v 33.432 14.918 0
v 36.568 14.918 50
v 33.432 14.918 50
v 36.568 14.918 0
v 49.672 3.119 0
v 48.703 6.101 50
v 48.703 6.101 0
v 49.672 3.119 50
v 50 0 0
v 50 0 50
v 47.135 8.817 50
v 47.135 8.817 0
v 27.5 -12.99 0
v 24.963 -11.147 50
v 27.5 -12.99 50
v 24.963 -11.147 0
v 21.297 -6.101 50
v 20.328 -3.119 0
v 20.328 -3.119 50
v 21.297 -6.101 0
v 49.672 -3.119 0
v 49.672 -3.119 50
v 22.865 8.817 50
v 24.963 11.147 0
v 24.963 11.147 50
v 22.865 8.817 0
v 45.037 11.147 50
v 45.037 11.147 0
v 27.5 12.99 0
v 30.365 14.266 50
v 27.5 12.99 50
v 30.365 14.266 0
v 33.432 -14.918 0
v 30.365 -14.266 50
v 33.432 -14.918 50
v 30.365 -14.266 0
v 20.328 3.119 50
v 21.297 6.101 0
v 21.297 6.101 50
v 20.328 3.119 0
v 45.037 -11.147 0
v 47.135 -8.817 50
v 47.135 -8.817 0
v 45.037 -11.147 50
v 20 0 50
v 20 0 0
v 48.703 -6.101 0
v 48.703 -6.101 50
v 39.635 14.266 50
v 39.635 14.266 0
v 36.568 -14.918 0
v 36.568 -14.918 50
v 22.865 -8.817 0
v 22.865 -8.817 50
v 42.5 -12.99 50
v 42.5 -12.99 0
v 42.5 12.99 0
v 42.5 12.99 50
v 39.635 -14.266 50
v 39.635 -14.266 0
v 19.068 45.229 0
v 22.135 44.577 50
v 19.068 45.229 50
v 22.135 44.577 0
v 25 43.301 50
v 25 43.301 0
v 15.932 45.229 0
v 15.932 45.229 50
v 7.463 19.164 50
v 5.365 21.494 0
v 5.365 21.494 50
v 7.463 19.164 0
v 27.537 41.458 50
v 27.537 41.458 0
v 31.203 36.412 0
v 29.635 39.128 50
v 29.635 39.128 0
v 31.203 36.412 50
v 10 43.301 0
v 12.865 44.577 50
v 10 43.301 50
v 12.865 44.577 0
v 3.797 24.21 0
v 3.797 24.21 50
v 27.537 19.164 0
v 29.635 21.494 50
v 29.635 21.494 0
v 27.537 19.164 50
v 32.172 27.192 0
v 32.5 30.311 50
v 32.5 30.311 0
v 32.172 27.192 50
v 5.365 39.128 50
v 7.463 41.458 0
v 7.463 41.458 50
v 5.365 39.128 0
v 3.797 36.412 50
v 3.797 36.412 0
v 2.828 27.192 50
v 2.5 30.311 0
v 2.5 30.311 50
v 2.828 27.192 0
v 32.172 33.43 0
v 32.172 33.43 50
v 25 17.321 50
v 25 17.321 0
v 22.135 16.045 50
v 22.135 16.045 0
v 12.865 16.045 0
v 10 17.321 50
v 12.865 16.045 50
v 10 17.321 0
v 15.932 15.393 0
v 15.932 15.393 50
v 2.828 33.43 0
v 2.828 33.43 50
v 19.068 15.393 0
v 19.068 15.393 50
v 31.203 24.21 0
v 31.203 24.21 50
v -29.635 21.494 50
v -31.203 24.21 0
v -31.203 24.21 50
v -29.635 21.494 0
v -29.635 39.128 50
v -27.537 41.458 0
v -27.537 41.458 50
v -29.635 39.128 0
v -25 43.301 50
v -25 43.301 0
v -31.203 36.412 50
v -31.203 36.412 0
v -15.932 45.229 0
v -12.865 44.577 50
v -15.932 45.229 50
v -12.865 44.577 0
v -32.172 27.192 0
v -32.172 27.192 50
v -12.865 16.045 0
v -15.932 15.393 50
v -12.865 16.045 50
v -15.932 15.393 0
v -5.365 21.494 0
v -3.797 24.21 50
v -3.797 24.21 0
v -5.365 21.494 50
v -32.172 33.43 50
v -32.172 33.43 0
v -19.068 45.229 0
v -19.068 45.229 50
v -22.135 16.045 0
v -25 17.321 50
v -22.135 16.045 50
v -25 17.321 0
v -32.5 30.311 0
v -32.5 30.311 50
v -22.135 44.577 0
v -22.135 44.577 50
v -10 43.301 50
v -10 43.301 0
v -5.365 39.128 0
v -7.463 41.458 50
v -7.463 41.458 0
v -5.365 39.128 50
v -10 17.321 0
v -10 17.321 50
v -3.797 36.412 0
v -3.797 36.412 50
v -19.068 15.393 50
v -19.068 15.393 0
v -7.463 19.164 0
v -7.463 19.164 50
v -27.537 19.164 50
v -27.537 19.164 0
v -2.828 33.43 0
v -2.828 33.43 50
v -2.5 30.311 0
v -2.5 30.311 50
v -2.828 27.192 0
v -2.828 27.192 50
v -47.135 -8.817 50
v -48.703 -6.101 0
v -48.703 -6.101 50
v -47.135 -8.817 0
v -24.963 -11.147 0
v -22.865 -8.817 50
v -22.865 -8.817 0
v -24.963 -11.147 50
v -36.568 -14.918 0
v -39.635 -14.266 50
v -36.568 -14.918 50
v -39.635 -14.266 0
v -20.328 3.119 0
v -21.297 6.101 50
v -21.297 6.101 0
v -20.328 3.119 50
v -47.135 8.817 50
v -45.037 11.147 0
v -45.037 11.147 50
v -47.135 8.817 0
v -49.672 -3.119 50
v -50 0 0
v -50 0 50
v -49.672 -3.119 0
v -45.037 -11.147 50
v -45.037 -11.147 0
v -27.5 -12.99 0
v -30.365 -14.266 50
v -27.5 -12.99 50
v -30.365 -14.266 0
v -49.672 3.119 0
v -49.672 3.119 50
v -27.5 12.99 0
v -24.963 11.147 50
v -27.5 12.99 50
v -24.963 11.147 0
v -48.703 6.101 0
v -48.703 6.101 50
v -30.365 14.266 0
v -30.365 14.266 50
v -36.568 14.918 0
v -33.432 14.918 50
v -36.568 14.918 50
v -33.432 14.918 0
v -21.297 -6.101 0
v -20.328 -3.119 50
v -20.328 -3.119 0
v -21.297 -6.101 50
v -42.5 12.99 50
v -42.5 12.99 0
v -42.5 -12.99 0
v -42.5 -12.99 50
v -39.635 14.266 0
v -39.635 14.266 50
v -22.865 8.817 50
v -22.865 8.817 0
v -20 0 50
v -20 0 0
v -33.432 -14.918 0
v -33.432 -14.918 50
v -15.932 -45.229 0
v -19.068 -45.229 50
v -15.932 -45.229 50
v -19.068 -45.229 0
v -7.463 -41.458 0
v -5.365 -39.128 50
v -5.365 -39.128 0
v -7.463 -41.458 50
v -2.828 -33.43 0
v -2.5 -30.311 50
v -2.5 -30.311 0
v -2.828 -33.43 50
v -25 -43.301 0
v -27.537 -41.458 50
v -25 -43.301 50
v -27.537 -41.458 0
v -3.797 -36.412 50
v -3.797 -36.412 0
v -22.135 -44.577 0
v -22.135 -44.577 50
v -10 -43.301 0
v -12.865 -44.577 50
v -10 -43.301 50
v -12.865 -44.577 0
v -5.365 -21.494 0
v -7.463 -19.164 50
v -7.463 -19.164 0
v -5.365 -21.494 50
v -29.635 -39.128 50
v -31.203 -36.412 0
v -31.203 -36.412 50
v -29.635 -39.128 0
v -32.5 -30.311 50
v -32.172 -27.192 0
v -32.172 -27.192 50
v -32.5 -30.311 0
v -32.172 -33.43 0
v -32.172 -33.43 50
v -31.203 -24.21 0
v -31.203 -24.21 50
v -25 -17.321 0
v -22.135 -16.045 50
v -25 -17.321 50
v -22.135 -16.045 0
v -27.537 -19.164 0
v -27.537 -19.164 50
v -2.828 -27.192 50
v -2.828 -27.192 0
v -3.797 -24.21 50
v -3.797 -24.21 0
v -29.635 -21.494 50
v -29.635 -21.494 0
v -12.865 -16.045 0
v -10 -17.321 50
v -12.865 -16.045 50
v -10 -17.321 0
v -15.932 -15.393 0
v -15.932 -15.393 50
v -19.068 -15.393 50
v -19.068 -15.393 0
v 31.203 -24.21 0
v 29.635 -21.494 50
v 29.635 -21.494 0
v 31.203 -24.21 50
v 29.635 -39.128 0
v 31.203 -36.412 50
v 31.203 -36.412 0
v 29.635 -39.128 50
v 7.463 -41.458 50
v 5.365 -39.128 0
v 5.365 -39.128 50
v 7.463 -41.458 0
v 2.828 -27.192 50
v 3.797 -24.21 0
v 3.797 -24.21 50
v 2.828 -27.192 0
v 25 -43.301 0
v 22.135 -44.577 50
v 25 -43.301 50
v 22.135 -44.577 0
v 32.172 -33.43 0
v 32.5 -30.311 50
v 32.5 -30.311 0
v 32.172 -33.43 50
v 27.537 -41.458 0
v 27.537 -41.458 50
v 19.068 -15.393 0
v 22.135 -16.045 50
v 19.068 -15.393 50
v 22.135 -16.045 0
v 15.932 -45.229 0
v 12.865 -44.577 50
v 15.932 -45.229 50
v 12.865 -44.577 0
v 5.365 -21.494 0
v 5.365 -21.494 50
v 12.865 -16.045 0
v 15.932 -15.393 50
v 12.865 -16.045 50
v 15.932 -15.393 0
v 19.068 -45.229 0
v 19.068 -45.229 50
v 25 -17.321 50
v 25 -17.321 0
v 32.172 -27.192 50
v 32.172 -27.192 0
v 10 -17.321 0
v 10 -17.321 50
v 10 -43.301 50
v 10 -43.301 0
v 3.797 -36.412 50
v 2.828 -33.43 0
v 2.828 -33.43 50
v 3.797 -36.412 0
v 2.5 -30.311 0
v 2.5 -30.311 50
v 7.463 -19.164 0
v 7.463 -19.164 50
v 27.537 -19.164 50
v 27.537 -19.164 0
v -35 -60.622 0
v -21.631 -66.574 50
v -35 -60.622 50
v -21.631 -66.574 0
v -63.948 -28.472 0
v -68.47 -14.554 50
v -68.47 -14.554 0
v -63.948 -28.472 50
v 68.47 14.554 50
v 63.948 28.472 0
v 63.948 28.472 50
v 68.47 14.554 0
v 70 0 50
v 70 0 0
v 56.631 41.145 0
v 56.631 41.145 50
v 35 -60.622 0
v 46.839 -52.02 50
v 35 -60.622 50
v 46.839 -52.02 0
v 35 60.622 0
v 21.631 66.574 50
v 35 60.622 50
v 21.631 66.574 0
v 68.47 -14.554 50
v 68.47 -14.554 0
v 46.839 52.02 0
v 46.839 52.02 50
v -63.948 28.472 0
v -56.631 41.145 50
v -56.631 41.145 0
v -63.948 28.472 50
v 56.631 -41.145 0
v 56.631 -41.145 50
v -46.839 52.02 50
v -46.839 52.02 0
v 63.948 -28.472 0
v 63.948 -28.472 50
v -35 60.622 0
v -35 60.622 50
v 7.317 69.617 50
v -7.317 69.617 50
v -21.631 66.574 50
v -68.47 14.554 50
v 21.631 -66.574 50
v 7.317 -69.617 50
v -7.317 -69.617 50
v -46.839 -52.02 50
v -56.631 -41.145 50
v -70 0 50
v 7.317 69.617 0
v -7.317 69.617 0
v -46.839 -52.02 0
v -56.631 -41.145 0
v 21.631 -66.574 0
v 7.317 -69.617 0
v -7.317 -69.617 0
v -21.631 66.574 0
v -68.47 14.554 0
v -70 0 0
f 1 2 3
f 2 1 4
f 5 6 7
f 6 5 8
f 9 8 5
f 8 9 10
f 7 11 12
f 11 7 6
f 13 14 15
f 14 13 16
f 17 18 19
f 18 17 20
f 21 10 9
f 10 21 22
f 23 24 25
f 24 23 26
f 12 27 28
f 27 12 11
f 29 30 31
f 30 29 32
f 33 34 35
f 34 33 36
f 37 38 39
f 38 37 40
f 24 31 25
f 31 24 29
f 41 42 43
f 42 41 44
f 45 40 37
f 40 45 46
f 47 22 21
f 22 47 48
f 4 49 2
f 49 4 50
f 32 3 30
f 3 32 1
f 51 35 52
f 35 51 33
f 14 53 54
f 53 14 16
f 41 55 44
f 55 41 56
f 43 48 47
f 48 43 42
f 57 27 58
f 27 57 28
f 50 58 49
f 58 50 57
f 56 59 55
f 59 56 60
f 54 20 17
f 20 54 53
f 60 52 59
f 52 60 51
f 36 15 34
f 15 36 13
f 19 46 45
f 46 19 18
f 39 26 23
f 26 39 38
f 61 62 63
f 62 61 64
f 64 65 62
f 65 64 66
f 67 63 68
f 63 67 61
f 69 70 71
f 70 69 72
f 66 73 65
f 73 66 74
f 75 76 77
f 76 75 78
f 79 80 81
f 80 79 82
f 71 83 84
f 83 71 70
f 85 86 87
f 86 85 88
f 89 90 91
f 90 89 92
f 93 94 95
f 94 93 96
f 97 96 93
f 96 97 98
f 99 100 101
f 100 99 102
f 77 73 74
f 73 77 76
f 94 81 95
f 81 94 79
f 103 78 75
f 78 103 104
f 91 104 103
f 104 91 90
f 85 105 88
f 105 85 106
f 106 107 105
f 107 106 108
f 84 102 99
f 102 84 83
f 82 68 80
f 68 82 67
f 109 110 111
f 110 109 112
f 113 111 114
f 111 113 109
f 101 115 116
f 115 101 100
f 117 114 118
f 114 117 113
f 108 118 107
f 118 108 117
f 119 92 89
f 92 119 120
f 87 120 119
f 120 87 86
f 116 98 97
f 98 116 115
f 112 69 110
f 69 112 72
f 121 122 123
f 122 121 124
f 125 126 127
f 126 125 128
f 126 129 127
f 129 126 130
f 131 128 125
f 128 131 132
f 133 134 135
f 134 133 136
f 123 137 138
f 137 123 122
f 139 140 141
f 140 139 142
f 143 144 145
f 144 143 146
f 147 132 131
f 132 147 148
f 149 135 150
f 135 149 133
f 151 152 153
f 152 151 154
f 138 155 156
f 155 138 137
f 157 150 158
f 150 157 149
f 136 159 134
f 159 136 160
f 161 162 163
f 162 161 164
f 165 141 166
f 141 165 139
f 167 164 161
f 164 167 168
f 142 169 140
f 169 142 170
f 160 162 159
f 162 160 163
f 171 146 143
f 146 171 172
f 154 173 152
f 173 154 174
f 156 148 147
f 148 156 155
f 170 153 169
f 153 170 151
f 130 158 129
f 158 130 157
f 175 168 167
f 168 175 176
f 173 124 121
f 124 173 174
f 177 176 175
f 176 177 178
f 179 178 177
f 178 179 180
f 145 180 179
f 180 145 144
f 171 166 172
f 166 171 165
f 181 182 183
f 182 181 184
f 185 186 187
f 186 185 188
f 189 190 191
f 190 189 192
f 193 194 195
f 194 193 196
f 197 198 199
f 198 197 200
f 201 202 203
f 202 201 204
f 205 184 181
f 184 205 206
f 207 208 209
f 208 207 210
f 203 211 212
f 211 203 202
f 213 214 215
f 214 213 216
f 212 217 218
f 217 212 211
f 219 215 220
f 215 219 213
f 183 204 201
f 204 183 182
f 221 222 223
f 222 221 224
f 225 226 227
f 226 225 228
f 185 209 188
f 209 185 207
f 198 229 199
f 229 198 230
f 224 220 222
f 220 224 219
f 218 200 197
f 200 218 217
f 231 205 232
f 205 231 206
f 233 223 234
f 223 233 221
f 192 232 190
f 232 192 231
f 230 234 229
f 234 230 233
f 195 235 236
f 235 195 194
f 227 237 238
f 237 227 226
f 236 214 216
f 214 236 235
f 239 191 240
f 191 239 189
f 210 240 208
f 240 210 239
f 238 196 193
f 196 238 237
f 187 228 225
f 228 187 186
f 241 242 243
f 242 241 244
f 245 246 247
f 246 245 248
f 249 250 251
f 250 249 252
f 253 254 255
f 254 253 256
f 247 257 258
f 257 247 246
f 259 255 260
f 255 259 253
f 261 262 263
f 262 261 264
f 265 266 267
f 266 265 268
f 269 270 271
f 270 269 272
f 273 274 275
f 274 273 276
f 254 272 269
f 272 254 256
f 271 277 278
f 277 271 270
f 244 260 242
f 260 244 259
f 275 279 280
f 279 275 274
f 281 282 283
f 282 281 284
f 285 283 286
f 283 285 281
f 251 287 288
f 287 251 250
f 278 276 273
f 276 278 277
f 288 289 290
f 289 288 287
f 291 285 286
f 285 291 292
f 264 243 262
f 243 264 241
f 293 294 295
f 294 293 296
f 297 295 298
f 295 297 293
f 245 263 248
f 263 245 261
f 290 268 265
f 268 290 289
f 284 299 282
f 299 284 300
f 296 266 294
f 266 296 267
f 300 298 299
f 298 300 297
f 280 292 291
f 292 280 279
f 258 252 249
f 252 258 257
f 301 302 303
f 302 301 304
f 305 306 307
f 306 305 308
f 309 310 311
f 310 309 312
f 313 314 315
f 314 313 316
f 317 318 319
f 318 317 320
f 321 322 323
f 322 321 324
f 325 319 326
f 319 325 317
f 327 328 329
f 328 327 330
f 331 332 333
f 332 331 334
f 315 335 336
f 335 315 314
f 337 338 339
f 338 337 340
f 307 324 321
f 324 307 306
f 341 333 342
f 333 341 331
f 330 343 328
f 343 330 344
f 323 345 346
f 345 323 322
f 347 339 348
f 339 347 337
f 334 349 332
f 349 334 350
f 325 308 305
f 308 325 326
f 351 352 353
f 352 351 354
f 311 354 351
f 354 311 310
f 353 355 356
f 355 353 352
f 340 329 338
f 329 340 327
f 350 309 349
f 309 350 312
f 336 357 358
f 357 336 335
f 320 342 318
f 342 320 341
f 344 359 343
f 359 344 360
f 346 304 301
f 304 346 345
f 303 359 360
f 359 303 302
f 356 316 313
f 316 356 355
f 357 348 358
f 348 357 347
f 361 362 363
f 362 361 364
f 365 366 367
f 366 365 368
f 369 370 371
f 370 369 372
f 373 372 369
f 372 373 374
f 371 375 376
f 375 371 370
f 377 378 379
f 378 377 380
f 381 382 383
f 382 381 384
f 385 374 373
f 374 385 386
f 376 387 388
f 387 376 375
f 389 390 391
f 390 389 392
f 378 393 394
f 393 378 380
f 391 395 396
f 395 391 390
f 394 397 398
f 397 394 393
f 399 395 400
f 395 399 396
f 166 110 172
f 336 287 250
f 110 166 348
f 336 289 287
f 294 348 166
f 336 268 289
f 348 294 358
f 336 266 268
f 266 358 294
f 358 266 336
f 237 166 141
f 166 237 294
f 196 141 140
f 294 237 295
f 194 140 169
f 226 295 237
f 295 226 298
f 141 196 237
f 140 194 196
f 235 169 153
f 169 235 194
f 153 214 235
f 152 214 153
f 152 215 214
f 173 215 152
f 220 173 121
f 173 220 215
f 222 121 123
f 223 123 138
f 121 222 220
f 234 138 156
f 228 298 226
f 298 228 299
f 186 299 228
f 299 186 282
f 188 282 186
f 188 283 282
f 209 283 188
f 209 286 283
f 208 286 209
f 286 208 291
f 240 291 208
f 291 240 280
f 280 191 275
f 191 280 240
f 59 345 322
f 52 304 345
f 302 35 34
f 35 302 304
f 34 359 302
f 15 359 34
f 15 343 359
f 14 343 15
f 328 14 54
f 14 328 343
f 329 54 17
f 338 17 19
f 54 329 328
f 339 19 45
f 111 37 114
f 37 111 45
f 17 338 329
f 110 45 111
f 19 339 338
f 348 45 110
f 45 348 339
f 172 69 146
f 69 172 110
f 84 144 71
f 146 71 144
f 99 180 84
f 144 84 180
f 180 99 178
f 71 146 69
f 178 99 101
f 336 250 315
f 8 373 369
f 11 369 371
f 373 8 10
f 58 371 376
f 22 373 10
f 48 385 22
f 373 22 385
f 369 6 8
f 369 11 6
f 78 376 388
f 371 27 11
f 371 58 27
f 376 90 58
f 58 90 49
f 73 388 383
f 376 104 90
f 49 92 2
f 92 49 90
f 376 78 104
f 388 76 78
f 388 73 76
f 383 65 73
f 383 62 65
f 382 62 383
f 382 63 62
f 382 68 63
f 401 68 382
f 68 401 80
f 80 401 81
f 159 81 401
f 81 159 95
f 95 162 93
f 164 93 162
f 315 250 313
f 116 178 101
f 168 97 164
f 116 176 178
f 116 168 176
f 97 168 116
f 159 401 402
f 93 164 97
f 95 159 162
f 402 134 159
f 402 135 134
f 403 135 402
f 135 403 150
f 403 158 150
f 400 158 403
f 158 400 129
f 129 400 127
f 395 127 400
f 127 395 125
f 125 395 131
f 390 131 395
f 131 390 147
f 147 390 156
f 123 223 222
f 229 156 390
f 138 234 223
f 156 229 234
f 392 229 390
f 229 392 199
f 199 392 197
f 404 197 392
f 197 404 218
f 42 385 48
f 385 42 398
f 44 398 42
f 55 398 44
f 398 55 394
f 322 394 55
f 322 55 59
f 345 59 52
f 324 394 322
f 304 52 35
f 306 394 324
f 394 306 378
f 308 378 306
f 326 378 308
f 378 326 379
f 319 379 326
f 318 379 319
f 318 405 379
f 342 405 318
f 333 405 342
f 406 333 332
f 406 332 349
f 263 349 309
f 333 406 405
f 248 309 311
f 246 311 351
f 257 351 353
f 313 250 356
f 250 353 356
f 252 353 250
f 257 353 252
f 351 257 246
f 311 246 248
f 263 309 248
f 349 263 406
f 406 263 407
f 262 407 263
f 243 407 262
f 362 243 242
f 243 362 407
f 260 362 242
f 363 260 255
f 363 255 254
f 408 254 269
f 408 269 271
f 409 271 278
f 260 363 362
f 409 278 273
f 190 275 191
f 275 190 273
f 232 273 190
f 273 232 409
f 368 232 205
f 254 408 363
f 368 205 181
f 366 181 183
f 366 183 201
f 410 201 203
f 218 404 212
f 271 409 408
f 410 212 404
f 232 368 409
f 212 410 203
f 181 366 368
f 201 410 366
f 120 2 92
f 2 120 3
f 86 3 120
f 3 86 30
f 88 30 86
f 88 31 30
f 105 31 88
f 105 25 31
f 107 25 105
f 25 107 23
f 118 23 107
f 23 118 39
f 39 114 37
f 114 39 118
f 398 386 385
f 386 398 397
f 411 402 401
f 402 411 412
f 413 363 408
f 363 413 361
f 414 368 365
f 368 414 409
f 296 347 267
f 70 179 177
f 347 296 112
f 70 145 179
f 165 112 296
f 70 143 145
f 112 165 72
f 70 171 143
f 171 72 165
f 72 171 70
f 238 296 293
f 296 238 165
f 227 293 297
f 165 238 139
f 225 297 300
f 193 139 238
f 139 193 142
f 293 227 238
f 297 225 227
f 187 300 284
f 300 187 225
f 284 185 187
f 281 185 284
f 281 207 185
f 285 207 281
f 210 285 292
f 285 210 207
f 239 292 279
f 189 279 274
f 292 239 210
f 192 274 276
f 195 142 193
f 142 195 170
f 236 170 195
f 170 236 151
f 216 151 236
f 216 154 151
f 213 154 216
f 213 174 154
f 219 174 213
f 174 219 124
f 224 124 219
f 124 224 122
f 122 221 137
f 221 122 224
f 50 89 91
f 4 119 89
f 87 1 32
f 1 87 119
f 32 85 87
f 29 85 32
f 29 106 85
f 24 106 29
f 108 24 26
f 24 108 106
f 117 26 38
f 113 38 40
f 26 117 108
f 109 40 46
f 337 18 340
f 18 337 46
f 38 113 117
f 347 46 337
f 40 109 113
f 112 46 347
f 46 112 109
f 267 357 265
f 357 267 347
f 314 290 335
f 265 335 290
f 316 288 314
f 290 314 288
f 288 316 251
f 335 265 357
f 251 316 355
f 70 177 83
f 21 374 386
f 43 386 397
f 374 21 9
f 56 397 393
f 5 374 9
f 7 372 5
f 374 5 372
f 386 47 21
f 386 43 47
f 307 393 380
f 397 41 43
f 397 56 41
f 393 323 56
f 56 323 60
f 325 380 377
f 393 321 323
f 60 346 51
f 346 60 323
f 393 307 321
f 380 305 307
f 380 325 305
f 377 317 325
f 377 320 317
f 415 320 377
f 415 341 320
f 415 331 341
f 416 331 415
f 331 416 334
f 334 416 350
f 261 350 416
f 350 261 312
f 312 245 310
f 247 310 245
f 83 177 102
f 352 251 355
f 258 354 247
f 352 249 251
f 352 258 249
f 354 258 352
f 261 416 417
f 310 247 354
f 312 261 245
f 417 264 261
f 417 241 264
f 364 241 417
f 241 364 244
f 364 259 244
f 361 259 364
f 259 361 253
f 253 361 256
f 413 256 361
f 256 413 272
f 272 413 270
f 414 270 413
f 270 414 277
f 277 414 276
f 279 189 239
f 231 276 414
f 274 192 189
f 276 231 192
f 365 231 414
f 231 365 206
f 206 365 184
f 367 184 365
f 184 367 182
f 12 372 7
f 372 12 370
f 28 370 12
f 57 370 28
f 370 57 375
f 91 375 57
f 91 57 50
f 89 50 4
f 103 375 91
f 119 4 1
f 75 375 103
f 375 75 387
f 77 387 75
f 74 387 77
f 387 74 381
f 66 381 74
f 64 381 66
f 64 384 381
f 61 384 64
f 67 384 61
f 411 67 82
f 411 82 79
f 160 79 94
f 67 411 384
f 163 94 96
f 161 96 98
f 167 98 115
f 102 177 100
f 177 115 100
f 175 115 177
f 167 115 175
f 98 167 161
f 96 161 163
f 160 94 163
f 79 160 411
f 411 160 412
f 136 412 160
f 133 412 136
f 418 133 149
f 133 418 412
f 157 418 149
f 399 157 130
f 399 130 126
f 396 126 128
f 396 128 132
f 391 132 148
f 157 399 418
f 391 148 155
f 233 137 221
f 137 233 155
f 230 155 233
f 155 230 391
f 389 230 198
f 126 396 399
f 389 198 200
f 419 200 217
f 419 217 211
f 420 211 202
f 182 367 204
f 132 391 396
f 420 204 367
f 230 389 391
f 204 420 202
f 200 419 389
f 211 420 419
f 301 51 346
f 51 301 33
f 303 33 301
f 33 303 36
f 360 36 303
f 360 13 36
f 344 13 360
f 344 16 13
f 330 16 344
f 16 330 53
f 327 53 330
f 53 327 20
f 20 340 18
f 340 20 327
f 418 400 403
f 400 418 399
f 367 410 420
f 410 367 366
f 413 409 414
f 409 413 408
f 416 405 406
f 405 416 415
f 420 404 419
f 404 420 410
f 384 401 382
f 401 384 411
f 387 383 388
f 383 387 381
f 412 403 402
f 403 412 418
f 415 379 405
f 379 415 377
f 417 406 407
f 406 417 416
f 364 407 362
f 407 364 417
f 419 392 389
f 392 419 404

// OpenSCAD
module roata(raza,grosime,raza_gaura,nr_gauri)
{
    difference(){
        cylinder (h=grosime,r=raza);
        for (i = [0 : 360/nr_gauri : 359])
            rotate([0,0,i])
                translate([raza/2,0,-1])
                    cylinder(r=raza_gaura,h=grosime+2);
    }
}
        
      
rotate([0,0,$t*360])
roata(raza=70,grosime=50,raza_gaura=15,nr_gauri=6);
